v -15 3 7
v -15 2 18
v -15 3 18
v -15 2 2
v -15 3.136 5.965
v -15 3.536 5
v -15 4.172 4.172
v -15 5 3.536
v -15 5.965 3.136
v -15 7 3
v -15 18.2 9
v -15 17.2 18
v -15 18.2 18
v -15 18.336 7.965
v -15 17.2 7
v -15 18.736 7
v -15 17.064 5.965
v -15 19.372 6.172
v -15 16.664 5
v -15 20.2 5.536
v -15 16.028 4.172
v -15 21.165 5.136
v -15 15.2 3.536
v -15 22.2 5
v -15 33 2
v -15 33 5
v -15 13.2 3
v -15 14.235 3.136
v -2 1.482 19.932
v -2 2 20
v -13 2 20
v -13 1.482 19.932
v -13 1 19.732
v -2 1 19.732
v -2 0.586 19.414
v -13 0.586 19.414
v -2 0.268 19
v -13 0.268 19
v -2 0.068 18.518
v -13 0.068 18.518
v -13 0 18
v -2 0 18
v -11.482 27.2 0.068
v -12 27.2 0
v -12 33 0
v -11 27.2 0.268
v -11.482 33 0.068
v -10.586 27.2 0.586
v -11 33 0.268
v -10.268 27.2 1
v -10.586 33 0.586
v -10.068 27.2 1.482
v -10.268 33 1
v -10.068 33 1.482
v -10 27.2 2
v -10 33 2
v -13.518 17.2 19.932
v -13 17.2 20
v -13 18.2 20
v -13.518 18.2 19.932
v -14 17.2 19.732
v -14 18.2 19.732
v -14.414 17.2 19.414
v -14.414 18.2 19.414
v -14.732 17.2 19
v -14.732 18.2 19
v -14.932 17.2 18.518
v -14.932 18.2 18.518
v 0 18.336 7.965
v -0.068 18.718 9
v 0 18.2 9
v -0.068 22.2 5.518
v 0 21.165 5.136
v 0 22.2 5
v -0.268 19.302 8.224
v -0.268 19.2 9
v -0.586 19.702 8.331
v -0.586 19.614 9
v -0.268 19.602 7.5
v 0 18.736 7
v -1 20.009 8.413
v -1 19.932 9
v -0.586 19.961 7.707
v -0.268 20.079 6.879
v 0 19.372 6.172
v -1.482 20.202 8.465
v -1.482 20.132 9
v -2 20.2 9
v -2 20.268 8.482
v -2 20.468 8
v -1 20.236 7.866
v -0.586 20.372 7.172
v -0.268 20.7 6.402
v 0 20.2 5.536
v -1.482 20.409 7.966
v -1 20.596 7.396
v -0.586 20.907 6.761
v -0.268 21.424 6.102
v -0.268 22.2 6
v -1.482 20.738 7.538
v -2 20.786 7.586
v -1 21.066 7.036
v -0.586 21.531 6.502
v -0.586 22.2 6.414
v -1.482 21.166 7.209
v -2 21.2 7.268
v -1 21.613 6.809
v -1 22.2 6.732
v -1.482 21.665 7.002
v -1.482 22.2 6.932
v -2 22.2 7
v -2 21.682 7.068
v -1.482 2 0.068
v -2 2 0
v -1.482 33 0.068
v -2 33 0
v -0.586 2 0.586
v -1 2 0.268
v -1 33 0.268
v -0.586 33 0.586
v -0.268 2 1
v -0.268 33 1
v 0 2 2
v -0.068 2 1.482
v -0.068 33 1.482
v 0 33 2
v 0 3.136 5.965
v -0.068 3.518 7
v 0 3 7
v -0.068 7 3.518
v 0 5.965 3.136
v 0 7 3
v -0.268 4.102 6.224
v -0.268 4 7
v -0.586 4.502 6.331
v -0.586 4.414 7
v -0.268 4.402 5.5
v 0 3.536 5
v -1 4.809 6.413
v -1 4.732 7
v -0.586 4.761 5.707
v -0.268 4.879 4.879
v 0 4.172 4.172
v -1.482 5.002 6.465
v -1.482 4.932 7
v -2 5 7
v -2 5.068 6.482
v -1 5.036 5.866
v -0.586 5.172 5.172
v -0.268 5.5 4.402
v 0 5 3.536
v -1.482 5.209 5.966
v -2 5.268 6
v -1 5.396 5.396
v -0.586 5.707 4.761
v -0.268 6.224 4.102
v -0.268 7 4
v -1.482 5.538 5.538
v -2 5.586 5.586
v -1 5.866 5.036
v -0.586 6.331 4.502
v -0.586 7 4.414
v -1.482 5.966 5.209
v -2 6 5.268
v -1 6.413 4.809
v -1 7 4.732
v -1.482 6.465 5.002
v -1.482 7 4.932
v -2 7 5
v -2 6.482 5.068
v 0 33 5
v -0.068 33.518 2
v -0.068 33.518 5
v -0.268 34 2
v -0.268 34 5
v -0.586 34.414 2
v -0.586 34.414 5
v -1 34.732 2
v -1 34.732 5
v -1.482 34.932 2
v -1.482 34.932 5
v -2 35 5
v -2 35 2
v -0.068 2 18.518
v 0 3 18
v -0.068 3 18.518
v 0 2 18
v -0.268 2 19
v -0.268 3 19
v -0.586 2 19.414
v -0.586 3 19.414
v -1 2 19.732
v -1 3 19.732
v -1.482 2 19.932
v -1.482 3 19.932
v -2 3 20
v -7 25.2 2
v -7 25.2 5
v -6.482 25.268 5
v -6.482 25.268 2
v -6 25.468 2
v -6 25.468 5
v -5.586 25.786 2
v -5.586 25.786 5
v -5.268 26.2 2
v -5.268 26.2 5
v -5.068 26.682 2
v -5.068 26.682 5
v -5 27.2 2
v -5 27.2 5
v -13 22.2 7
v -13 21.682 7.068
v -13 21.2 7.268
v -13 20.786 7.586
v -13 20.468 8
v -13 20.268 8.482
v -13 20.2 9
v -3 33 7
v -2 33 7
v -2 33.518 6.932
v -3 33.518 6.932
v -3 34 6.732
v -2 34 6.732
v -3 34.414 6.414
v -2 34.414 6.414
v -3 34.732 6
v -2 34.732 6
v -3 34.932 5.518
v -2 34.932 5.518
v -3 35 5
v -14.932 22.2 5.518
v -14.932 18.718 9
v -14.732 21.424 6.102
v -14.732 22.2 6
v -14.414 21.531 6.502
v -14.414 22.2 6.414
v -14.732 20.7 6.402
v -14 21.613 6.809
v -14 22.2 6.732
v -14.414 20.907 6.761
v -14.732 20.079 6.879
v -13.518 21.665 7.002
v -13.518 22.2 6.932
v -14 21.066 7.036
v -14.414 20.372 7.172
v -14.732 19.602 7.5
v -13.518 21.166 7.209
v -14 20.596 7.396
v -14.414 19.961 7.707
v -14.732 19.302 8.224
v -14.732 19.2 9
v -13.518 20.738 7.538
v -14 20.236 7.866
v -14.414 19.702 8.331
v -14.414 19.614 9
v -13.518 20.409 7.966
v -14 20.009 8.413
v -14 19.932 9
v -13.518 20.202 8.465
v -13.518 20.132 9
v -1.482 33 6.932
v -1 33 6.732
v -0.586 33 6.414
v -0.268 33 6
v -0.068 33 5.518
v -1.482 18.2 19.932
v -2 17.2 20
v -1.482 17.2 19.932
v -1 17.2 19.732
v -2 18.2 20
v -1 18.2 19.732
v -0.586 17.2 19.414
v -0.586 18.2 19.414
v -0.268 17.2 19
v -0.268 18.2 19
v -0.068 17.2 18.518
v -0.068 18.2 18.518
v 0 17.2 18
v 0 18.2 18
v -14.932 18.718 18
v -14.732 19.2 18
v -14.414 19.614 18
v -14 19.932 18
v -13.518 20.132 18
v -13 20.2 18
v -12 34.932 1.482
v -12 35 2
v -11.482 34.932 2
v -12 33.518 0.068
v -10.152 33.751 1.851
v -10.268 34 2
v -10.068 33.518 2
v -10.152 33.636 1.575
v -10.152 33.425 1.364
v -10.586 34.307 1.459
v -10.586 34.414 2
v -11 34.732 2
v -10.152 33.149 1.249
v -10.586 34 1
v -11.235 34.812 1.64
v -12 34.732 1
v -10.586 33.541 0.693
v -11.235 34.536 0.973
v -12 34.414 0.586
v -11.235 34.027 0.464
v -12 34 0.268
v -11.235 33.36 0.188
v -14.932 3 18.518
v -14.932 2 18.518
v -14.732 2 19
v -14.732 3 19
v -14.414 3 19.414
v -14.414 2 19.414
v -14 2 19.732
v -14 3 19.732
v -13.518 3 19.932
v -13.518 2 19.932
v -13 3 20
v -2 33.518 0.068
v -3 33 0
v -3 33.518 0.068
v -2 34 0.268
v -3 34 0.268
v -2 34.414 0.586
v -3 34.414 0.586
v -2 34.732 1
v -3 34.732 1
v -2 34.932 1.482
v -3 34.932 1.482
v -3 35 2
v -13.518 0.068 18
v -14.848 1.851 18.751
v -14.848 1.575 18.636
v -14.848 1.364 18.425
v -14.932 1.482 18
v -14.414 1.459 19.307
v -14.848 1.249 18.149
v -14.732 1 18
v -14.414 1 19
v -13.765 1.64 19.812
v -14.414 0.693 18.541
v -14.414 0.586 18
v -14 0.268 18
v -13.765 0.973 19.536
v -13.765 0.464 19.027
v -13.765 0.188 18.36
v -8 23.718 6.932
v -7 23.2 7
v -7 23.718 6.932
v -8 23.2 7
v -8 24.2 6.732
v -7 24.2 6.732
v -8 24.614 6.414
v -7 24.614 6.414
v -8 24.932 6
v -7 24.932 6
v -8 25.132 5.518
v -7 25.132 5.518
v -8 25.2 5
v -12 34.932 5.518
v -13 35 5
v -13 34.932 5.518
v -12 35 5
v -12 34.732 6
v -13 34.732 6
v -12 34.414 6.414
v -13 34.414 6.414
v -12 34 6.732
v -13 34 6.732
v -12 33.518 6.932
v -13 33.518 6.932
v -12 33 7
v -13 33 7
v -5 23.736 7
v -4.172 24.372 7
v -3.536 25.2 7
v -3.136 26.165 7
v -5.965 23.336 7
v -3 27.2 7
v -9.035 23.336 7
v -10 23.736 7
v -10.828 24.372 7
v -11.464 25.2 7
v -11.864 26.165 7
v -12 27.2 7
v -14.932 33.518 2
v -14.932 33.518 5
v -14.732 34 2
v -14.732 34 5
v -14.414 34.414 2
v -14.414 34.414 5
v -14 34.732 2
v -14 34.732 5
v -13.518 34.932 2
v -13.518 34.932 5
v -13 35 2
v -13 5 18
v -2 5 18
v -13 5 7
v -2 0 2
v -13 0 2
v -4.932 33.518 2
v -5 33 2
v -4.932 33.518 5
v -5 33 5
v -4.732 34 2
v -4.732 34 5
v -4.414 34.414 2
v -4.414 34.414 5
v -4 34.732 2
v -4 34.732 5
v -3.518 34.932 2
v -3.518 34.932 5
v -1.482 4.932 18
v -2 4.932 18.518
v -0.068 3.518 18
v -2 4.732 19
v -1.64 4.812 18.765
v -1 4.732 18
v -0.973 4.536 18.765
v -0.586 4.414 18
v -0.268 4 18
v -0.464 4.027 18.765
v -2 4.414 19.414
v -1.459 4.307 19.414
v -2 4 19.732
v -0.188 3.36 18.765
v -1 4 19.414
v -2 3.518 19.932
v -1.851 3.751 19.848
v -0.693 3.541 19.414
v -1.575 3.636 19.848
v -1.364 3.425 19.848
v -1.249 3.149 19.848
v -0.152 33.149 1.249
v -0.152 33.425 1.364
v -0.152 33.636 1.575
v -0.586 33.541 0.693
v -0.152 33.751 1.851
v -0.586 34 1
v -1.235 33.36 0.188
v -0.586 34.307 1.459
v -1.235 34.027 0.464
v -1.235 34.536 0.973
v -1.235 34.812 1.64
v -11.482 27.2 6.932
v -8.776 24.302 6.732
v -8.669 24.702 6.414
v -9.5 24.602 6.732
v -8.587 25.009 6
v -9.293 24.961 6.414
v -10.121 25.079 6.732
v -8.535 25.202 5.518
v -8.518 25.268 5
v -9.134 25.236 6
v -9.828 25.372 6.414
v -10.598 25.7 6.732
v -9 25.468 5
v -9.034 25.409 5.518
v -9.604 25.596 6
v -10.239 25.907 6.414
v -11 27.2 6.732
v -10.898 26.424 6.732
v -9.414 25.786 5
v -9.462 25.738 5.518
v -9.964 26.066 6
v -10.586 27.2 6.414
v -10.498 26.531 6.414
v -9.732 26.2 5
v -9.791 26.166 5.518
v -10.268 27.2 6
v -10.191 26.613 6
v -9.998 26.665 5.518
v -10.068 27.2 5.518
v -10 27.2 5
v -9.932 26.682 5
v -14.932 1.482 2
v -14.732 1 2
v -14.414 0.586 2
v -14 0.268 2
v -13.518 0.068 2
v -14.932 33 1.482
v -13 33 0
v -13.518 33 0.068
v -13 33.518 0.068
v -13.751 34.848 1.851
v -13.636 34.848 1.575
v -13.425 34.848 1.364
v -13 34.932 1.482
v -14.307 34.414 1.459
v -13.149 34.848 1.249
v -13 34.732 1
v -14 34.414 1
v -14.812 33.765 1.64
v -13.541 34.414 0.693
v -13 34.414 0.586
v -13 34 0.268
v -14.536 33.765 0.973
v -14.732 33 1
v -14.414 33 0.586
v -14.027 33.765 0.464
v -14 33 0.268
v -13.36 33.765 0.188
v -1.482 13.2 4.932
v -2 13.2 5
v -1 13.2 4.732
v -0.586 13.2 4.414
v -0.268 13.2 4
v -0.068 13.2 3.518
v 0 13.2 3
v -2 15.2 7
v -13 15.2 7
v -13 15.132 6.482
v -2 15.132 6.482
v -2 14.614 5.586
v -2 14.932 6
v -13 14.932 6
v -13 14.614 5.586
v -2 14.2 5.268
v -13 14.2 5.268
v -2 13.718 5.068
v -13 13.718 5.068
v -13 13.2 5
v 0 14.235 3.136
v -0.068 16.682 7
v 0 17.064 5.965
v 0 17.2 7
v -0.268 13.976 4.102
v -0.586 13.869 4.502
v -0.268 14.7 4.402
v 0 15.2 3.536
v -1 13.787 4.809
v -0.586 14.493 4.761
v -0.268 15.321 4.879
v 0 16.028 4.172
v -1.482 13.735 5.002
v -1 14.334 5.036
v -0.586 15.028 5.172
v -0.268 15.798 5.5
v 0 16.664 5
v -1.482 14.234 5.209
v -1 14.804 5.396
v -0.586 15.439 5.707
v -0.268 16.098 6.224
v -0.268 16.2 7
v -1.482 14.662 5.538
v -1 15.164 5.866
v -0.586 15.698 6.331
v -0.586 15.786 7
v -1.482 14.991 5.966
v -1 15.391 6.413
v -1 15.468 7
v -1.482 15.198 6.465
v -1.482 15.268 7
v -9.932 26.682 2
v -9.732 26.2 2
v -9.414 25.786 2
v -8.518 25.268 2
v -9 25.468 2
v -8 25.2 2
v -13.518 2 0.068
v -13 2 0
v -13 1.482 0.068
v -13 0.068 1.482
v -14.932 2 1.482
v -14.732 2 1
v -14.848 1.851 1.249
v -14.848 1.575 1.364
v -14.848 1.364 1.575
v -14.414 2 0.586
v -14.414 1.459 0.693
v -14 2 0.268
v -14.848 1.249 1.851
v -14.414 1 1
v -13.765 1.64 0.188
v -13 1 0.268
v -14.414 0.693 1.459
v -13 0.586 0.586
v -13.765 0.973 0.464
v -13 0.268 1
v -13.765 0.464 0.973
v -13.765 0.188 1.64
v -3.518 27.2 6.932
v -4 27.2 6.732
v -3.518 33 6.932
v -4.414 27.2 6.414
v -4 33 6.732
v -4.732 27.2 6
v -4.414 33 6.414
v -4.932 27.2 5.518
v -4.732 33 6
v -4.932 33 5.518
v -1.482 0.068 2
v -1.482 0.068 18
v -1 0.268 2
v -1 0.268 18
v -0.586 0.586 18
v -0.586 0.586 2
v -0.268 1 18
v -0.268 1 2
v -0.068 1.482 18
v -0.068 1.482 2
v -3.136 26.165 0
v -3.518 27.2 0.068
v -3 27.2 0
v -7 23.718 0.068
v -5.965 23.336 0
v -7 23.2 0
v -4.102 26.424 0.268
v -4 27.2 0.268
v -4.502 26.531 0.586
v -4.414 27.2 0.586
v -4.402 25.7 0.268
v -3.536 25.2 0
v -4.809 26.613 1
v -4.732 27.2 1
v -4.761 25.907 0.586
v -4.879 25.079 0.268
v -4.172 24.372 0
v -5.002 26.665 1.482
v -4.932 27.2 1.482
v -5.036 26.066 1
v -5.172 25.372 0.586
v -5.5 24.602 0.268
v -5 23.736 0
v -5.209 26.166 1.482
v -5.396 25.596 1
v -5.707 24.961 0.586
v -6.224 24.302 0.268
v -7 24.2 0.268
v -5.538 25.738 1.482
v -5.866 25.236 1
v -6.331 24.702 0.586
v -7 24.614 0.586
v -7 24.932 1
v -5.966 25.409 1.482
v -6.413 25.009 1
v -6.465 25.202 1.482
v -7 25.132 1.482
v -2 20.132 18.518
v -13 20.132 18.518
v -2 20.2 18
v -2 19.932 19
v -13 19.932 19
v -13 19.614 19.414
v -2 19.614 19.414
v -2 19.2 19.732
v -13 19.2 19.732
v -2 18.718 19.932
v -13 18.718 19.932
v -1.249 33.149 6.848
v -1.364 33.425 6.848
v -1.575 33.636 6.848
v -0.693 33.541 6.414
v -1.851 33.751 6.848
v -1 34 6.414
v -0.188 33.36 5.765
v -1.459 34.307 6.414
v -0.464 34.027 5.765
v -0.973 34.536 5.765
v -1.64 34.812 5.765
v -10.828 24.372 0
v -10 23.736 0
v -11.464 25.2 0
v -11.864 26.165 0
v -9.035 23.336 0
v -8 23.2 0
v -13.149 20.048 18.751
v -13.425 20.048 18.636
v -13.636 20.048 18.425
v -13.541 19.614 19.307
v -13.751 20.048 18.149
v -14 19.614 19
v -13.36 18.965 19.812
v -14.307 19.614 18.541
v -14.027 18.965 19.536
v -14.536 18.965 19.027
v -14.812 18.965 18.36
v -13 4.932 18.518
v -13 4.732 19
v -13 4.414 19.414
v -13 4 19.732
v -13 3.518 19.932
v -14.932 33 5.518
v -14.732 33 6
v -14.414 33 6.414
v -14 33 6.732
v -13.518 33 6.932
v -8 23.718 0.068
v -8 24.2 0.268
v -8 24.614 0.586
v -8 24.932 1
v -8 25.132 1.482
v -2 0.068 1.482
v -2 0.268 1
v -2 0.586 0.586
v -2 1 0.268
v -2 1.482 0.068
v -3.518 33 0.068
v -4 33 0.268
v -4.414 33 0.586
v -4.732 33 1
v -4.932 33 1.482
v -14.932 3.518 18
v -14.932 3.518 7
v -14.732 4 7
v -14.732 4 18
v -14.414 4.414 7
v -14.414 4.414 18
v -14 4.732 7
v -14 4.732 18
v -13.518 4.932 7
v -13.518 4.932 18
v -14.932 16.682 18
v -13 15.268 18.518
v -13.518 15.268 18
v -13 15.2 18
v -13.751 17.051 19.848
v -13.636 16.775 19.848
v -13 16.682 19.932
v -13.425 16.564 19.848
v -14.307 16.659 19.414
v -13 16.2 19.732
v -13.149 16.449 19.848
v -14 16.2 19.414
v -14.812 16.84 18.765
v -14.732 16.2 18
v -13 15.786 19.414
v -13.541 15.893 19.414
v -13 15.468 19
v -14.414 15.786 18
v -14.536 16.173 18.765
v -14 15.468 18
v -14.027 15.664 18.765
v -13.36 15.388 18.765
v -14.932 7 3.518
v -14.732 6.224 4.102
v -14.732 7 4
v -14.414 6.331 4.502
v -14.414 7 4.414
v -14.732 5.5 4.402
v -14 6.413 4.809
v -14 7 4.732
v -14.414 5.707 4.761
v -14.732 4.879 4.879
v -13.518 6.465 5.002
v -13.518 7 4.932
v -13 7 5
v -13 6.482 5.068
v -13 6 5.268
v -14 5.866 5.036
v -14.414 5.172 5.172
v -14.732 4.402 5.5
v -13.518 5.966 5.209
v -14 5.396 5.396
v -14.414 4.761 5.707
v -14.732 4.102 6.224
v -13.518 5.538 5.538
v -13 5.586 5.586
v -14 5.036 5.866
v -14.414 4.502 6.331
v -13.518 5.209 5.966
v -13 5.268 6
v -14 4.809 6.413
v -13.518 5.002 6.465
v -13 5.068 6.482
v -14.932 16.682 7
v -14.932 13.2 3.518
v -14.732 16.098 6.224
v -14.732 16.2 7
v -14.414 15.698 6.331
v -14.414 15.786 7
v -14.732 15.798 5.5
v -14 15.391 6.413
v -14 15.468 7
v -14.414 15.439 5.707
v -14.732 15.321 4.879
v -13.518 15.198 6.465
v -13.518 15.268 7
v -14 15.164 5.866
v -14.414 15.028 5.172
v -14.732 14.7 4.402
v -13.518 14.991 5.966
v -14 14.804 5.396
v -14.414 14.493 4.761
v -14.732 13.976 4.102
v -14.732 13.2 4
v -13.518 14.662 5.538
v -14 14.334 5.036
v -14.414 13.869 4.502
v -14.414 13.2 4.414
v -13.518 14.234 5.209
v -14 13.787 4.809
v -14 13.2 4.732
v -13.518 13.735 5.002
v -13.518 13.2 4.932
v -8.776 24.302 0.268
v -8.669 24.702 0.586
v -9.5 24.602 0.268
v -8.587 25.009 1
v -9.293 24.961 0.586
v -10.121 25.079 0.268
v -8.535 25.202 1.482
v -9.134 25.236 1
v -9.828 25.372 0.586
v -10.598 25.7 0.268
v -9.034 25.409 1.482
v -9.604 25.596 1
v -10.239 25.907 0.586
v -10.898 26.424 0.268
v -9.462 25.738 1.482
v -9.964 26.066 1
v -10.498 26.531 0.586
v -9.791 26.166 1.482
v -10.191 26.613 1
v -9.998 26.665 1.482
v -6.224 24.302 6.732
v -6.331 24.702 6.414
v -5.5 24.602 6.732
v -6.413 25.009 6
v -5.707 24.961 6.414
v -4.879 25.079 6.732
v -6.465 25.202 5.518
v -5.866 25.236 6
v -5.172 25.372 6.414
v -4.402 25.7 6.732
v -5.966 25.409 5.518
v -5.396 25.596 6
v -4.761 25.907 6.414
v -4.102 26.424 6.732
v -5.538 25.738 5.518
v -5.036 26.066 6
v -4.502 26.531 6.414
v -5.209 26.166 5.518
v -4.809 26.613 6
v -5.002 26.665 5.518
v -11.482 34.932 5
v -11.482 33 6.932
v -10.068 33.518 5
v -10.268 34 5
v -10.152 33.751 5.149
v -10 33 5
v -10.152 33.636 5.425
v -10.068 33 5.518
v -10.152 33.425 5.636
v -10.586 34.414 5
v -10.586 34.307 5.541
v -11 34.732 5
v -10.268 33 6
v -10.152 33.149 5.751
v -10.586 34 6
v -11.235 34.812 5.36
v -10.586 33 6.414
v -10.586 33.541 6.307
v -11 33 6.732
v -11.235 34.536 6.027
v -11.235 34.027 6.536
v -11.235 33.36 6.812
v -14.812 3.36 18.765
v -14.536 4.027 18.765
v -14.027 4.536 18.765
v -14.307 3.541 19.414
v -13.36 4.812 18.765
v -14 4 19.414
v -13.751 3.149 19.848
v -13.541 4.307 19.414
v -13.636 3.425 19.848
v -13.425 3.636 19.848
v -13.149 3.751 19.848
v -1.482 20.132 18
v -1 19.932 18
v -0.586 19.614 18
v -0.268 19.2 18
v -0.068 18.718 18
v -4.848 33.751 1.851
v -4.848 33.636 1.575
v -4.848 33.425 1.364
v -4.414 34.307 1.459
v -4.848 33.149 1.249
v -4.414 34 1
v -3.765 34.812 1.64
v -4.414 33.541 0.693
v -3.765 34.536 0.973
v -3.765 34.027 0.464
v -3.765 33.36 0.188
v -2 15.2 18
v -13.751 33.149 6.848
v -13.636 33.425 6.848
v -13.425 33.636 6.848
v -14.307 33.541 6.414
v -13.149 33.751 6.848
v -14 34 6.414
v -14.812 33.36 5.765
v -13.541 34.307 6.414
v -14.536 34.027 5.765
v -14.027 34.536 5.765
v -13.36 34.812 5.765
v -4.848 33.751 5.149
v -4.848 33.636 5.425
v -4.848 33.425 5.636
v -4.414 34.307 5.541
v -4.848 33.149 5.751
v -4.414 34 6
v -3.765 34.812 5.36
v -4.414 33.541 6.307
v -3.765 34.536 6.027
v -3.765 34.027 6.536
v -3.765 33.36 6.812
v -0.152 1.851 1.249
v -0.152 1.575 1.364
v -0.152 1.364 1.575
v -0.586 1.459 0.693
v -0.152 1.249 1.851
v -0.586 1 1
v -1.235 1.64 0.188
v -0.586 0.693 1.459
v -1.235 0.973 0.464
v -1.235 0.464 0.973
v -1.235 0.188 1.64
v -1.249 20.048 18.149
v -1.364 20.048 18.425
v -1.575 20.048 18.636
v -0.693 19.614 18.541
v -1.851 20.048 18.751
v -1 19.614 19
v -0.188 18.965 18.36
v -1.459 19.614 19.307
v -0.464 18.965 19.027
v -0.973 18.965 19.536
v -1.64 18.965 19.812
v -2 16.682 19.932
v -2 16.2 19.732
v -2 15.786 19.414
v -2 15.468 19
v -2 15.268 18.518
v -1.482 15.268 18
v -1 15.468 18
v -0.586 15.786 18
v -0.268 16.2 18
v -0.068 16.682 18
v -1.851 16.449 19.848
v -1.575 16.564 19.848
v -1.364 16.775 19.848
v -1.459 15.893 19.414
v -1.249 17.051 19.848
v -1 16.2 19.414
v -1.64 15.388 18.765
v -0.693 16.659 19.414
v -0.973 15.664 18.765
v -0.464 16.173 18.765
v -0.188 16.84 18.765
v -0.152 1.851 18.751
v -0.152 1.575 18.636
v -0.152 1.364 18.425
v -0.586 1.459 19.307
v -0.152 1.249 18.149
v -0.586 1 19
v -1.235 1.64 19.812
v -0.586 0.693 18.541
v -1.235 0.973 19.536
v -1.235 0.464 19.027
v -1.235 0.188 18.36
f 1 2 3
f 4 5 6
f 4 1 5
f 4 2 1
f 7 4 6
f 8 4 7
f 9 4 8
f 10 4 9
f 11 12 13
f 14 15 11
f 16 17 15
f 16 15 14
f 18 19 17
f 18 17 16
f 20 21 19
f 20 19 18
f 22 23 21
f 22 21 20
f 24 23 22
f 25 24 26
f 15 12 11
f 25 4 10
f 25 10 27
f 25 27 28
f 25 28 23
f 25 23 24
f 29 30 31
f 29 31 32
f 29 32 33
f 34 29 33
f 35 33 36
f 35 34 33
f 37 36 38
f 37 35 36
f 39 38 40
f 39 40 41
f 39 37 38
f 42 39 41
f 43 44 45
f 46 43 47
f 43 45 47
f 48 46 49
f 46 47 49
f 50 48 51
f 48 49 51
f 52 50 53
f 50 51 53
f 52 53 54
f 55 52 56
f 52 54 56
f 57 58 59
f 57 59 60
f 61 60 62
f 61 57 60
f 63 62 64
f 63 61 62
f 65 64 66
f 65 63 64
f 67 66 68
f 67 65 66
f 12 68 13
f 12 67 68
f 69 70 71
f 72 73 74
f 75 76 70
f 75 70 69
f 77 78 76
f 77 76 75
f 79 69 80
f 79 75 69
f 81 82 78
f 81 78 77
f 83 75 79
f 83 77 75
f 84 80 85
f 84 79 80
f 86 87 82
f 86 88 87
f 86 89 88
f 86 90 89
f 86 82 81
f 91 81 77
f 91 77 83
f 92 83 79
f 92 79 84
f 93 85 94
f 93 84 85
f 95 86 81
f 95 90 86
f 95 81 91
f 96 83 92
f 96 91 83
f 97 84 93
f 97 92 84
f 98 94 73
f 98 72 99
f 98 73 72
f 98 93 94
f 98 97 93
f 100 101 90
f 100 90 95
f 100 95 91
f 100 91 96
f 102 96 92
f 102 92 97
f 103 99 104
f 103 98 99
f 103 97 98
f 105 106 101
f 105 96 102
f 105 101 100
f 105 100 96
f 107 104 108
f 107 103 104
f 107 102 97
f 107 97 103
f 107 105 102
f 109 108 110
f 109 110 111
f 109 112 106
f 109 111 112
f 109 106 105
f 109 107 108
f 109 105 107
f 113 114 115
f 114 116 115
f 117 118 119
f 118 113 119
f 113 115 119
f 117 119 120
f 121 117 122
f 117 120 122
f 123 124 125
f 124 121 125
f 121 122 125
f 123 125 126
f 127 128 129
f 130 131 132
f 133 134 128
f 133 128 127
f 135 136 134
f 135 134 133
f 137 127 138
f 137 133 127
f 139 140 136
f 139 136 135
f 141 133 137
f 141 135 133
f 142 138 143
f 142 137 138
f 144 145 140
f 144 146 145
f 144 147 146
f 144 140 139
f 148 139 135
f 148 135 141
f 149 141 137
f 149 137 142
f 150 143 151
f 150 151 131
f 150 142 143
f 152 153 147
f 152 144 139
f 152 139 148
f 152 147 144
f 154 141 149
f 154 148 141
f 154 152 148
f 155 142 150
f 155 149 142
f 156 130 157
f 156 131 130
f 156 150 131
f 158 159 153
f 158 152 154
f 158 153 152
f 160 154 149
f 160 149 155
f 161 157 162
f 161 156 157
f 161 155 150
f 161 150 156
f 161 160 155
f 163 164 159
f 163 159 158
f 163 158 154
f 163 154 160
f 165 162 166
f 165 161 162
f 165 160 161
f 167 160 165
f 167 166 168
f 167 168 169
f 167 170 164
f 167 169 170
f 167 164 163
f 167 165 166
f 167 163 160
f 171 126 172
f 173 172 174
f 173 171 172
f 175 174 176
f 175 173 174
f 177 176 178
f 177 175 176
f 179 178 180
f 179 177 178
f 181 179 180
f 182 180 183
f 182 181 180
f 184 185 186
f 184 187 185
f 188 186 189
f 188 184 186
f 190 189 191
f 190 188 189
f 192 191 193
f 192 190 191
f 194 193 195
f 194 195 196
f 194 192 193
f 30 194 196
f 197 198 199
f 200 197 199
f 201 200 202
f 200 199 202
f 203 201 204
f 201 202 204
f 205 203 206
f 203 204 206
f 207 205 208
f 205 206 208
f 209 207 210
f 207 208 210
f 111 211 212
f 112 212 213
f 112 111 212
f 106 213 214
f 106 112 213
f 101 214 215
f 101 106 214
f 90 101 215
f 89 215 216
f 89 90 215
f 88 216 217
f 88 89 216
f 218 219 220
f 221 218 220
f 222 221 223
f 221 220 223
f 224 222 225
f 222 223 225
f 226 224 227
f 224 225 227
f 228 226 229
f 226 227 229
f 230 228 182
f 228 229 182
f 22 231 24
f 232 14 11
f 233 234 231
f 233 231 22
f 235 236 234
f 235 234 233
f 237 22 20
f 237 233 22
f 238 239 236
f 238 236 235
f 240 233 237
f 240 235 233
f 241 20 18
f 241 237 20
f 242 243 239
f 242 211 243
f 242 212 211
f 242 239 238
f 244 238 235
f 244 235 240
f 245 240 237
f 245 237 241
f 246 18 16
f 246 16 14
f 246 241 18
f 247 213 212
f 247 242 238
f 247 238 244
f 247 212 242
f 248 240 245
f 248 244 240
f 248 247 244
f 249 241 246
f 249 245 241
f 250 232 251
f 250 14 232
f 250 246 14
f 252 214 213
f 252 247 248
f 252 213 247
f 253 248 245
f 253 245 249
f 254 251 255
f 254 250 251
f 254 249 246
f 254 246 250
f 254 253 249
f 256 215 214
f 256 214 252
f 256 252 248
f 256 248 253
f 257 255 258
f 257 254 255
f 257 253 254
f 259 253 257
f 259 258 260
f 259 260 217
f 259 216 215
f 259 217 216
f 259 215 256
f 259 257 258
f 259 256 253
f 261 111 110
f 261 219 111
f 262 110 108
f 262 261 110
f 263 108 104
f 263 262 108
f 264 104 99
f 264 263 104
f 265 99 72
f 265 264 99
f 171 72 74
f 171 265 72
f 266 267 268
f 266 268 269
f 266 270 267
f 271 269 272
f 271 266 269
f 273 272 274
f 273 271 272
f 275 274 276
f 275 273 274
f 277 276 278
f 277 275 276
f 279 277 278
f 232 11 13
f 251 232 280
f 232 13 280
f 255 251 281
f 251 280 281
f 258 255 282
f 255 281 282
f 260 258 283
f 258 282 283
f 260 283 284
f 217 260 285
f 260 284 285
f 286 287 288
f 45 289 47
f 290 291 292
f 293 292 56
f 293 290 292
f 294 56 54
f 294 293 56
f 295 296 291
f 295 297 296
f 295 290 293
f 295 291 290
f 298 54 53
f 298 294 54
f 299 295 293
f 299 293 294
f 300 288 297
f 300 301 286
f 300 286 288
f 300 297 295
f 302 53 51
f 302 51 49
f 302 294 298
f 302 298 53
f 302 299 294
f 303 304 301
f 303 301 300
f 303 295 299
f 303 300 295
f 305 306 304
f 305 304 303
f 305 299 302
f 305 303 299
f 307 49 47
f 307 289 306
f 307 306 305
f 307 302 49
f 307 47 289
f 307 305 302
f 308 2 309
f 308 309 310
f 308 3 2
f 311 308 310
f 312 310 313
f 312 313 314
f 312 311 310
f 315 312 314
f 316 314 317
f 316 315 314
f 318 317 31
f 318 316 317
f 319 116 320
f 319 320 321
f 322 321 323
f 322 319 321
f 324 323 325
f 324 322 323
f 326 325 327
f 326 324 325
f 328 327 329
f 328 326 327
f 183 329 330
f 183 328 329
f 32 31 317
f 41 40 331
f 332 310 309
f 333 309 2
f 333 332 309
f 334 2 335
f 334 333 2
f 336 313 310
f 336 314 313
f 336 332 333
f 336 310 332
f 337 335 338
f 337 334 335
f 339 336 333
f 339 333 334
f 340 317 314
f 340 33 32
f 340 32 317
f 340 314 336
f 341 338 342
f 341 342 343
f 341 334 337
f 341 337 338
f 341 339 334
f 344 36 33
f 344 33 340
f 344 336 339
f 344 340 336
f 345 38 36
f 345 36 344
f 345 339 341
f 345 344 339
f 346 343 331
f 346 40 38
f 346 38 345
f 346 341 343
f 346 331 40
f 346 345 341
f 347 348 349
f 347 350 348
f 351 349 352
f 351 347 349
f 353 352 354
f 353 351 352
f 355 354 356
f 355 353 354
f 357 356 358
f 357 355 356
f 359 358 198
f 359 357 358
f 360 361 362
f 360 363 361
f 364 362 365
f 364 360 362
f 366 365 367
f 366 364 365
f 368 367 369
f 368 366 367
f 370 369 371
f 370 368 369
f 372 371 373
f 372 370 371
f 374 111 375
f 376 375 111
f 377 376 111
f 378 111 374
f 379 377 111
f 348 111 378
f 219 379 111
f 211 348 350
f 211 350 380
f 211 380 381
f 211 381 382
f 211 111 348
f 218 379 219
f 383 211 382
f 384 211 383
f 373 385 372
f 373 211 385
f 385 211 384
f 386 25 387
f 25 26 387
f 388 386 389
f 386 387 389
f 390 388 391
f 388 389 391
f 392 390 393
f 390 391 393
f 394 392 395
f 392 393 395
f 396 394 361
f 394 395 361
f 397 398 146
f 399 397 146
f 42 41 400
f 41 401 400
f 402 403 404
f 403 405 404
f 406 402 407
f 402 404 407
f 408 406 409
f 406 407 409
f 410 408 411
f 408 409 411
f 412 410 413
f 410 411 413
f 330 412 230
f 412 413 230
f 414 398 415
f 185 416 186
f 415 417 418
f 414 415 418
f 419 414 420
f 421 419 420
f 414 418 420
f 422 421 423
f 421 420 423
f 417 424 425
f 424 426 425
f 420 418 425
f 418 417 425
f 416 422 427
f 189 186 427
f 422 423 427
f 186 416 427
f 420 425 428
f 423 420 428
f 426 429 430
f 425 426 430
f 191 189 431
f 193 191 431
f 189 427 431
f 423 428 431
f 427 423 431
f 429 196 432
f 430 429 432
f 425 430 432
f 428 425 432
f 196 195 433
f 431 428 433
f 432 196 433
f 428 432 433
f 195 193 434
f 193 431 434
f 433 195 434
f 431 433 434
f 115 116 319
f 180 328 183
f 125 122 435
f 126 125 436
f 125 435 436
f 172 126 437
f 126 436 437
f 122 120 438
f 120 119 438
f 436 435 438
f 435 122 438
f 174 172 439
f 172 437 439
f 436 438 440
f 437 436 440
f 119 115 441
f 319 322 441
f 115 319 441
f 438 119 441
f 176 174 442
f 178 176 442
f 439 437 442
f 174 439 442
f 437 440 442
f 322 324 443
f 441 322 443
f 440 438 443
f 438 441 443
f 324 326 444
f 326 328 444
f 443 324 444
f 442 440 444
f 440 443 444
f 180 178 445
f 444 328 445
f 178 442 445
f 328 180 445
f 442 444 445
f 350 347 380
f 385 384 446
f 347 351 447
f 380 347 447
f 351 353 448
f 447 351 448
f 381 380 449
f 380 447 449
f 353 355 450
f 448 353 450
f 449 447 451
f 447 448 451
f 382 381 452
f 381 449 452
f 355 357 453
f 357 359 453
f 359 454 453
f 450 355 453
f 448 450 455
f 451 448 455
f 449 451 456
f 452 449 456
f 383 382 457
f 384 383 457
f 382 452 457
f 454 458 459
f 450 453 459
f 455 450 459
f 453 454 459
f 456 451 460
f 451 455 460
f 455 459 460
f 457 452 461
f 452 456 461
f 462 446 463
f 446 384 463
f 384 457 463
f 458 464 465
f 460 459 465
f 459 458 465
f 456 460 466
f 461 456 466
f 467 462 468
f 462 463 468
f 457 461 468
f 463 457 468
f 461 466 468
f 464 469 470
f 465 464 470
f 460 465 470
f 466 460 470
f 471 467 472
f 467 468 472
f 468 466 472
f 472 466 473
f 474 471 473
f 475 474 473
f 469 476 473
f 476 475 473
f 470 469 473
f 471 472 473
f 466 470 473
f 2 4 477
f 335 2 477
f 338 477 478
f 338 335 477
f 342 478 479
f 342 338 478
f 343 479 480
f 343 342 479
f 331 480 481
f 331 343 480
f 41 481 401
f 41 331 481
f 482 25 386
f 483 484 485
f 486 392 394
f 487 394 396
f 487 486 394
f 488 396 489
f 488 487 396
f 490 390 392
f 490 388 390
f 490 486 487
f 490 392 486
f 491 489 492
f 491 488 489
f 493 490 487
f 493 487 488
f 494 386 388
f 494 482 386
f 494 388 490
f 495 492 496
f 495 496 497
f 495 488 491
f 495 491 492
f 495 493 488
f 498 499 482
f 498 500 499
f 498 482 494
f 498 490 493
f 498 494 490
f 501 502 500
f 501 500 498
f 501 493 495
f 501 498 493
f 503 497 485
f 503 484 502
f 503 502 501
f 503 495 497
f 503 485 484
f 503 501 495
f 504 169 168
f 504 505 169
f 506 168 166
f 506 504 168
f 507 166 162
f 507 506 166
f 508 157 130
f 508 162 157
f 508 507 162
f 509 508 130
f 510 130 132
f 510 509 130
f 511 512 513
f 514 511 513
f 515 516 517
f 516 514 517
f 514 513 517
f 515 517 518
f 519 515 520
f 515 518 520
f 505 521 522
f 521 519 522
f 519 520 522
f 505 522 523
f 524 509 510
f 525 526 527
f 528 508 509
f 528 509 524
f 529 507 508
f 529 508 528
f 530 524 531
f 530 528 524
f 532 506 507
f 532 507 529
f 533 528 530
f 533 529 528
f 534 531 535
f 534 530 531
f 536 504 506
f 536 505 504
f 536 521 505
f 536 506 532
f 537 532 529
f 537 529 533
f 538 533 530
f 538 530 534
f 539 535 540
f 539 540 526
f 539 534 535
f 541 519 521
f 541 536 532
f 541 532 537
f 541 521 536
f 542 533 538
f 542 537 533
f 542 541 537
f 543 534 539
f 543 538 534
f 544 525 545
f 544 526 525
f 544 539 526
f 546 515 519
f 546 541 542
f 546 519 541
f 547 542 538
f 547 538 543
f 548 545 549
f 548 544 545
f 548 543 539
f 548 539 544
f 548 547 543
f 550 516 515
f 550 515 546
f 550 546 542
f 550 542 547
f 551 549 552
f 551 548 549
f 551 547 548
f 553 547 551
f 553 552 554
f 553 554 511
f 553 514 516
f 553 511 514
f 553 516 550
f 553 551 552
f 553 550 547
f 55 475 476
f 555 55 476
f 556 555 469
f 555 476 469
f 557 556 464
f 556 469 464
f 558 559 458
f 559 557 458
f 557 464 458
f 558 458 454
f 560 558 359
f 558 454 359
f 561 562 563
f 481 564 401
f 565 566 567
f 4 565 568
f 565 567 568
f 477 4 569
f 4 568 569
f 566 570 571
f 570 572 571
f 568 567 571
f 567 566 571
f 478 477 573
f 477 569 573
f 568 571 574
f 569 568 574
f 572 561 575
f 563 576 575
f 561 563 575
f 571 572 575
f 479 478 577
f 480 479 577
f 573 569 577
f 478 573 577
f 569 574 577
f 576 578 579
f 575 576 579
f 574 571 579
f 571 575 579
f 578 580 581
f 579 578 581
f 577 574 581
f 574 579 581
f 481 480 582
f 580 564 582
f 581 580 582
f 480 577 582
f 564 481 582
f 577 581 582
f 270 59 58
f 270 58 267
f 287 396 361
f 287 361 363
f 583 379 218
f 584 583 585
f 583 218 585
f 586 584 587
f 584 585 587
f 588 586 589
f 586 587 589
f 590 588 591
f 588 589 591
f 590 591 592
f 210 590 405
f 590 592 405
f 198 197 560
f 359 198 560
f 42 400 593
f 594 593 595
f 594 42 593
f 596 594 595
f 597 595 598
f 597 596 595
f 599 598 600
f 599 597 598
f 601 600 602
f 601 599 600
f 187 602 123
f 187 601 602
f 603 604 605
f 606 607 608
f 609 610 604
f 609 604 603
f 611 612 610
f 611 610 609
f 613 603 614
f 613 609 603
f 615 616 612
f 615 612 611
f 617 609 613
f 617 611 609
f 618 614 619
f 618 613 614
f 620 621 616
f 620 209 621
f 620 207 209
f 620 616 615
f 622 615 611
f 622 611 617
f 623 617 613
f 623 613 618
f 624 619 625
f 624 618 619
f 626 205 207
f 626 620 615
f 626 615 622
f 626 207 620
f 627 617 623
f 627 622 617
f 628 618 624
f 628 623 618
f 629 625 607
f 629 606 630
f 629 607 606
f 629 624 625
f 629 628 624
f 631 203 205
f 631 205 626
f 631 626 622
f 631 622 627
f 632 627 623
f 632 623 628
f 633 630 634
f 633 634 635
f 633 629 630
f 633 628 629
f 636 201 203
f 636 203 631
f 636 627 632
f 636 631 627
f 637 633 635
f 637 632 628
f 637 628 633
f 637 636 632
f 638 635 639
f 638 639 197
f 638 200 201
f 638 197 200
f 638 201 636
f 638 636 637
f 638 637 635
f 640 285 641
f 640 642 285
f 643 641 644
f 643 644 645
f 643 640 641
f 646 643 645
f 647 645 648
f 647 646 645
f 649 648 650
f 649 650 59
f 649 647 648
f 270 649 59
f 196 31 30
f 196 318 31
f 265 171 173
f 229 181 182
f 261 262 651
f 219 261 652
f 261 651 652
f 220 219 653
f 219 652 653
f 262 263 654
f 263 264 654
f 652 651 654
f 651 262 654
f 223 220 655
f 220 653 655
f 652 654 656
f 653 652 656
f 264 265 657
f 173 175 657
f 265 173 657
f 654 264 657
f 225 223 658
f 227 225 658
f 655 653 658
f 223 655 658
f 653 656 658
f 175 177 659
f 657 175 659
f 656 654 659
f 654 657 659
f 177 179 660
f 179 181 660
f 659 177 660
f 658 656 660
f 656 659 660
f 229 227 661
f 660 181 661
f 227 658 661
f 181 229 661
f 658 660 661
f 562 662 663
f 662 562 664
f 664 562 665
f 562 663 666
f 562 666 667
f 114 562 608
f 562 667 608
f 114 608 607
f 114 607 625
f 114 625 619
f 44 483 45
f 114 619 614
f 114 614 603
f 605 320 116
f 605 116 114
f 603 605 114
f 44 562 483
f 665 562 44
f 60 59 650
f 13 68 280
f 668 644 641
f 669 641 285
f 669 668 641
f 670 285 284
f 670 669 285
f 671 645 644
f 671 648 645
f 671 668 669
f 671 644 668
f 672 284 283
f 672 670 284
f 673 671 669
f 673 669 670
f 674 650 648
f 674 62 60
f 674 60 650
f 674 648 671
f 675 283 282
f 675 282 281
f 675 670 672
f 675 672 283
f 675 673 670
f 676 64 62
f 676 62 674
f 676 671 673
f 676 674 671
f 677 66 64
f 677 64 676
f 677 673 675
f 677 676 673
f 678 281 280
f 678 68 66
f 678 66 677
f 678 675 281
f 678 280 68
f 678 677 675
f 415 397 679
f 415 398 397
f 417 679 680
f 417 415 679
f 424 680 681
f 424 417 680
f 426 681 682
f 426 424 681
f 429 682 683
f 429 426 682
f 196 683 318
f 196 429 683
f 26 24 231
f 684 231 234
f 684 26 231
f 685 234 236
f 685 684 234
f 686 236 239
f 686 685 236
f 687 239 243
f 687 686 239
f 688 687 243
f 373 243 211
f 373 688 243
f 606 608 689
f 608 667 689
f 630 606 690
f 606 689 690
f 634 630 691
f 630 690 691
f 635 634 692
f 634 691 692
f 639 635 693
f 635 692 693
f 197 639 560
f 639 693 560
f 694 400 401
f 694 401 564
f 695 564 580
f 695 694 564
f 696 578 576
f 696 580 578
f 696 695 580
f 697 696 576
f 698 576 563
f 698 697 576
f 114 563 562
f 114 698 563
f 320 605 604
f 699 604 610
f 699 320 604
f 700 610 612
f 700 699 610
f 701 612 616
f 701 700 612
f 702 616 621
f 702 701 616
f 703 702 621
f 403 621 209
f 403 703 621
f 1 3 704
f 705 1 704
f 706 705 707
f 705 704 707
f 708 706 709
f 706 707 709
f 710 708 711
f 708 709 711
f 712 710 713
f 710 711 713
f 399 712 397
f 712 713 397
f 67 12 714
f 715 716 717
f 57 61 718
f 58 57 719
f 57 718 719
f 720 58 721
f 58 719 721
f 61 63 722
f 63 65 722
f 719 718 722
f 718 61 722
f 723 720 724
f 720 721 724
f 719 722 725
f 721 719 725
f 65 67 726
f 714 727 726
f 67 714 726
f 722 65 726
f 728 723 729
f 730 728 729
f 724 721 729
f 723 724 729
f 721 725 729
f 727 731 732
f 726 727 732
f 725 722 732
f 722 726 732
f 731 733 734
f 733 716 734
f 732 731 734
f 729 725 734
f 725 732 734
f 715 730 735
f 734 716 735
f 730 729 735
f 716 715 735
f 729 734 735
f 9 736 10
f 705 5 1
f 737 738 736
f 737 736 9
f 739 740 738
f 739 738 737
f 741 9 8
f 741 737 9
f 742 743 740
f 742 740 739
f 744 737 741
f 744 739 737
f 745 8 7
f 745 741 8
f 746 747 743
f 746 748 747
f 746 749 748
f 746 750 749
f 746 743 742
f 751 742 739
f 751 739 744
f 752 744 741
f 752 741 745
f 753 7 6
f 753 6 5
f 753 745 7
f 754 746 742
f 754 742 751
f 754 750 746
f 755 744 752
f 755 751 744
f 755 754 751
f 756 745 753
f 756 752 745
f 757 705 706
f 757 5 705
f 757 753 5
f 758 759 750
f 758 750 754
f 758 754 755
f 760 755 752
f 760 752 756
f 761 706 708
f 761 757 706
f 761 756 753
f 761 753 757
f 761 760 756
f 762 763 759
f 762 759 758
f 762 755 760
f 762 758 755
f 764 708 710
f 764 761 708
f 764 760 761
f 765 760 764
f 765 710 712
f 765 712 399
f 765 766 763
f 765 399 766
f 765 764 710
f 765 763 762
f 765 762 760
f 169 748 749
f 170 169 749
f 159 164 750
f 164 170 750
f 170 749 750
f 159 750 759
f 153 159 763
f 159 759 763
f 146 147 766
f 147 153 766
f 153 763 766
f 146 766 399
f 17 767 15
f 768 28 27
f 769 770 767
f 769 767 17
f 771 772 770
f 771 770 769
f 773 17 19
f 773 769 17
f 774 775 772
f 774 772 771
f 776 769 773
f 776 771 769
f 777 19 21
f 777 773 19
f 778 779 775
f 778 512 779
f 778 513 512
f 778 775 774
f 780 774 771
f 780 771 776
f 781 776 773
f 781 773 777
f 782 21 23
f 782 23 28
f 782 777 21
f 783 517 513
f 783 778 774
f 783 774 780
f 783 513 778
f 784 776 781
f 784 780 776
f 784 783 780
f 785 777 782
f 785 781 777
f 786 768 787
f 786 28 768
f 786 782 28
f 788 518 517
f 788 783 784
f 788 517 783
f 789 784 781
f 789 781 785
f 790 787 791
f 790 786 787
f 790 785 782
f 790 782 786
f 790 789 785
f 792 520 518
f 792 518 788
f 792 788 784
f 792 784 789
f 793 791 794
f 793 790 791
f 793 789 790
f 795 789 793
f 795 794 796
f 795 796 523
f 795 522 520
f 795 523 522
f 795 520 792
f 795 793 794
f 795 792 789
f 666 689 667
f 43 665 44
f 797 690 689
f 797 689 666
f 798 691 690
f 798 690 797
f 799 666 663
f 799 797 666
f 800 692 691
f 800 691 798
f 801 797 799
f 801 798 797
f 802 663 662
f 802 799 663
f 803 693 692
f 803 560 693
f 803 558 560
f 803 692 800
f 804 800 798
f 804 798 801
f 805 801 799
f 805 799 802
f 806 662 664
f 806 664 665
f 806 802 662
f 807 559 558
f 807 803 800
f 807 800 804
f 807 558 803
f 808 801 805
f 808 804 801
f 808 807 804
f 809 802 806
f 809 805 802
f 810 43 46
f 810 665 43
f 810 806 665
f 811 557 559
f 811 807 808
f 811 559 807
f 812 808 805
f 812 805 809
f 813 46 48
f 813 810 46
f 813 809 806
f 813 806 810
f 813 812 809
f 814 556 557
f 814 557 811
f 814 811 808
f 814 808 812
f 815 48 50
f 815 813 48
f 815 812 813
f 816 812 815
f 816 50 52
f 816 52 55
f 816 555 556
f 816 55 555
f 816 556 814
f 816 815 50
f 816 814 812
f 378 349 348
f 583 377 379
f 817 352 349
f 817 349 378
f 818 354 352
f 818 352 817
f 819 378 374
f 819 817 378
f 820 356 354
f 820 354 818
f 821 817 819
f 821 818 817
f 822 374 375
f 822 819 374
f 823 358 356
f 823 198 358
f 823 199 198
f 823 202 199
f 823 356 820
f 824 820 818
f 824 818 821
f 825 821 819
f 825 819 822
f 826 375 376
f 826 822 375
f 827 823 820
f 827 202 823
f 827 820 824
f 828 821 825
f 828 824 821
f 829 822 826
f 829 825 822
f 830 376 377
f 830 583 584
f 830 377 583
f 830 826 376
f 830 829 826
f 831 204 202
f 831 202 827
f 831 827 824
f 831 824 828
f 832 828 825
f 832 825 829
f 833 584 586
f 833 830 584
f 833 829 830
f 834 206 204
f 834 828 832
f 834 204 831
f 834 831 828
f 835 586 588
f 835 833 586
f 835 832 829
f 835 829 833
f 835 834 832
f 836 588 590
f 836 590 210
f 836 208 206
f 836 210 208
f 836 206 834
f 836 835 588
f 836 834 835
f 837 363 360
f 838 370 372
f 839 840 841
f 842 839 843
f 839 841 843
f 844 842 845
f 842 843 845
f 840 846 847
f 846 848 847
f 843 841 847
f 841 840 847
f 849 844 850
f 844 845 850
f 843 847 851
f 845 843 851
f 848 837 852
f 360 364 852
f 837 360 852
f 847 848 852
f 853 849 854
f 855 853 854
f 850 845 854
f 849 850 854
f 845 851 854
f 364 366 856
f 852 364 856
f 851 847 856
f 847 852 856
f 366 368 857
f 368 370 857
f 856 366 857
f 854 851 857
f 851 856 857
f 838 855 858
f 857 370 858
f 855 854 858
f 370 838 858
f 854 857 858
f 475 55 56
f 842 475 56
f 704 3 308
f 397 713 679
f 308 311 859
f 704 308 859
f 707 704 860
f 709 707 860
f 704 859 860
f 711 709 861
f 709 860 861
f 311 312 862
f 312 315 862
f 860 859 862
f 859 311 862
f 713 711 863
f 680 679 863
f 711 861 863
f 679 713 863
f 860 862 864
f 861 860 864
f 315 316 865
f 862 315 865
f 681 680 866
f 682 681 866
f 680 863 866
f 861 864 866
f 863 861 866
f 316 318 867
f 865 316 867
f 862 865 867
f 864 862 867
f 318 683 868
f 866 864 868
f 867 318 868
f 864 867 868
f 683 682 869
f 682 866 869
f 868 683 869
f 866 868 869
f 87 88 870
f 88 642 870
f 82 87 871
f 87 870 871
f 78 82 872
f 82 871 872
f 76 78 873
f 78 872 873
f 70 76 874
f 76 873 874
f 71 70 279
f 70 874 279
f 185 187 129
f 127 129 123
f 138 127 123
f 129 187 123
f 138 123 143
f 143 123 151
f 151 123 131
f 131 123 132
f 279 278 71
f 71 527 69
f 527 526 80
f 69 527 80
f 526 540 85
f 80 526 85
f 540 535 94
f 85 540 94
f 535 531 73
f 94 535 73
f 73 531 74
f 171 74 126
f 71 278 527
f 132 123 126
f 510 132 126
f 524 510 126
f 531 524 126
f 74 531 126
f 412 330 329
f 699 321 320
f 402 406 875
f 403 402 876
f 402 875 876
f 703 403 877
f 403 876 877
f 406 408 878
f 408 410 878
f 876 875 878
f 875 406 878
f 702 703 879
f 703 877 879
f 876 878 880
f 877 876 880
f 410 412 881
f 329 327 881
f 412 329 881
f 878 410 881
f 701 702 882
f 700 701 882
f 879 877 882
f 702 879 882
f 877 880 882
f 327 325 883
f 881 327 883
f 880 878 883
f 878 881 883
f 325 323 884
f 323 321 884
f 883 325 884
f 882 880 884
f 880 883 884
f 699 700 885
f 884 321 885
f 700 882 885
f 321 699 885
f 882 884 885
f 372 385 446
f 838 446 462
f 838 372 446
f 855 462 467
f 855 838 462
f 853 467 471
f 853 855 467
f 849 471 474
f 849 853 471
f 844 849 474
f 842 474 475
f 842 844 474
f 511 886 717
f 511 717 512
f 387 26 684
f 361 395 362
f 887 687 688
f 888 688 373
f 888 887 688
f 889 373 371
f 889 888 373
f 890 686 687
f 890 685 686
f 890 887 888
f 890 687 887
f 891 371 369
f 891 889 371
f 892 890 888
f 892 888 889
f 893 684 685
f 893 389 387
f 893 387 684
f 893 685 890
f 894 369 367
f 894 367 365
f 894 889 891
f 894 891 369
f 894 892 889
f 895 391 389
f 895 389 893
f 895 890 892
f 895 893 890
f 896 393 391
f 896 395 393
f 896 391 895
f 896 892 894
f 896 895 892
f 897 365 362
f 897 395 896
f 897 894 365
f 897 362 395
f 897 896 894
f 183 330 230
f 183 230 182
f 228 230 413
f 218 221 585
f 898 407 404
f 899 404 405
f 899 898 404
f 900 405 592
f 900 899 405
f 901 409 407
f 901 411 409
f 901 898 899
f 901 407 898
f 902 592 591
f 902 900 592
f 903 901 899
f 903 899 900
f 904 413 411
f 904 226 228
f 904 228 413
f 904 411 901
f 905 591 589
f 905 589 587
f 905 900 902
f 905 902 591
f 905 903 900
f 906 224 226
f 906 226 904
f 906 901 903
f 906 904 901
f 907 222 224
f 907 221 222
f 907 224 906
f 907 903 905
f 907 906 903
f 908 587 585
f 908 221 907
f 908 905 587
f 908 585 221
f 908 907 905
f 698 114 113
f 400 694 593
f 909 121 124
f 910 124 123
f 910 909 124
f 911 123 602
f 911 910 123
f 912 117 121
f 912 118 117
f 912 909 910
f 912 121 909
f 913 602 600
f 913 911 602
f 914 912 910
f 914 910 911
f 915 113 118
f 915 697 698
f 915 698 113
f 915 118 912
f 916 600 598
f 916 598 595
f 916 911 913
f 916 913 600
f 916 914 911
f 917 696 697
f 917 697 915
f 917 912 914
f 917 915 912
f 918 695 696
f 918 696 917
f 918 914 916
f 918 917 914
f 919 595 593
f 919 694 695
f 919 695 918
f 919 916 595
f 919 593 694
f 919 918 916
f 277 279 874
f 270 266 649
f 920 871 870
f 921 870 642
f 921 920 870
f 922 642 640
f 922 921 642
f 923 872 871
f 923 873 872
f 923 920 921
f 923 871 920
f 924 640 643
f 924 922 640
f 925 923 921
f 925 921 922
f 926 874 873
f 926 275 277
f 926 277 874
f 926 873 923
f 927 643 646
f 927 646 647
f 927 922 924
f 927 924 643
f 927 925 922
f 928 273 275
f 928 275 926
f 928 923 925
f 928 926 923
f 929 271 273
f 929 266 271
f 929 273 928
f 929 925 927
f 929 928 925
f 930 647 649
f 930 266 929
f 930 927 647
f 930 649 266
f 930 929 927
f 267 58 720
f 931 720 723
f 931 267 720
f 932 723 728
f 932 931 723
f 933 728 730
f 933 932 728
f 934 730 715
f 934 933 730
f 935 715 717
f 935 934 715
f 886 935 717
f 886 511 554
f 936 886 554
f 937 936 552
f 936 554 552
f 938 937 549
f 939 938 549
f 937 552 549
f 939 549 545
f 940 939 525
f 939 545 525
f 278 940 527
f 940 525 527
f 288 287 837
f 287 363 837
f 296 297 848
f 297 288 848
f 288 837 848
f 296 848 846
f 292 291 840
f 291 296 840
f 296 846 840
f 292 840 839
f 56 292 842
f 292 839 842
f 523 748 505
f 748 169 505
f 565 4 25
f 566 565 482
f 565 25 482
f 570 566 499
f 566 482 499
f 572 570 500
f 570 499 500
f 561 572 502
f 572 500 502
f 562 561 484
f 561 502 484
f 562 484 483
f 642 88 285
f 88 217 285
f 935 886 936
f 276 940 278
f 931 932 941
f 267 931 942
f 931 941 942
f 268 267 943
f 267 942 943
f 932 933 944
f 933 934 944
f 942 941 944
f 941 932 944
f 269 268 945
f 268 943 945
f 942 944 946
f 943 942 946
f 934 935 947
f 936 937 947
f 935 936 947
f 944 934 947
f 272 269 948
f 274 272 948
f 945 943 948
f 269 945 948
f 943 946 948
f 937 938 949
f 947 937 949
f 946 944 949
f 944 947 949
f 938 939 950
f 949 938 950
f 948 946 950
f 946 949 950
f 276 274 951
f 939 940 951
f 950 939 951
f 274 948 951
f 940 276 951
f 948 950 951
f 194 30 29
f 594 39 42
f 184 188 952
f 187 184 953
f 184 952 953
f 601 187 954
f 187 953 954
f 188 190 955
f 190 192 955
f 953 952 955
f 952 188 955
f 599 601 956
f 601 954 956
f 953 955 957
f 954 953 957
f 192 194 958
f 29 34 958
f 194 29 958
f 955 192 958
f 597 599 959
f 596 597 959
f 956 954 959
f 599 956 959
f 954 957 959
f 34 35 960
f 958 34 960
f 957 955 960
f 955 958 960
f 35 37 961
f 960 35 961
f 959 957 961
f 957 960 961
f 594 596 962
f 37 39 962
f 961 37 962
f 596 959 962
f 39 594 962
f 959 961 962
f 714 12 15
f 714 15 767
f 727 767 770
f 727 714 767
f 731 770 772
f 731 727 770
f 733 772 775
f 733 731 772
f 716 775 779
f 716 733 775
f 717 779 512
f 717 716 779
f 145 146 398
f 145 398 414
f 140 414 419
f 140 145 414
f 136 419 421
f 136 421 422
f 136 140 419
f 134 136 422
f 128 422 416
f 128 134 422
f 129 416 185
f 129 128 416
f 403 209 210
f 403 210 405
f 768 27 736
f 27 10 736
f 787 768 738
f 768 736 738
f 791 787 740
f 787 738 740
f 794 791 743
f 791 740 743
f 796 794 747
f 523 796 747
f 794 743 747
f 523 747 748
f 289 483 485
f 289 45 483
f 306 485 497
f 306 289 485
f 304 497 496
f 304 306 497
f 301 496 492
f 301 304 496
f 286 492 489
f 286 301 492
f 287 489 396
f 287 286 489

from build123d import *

# Parameters (mm, degrees)
SKETCH1_W                      = 15
SKETCH1_H                      = 35
BOSS_EXTRUDE1_DEPTH            = 20
SKETCH2_W                      = 15
SKETCH2_H                      = 10.2
CUT_EXTRUDE1_DEPTH             = 44.011626335
FILLET1_R                      = 2
SKETCH4_W                      = 13
SKETCH4_H                      = 14.8
CUT_EXTRUDE3_DEPTH             = 44.011626335
CUT_EXTRUDE4_REACH             = 45.012
SKETCH5_W                      = 5
SKETCH5_H                      = 9.8
CUT_EXTRUDE4_DIRECTION_2_DEPTH = 44.011626335
FILLET2_R                      = 2


with BuildPart() as part:
    # Sketch1 → Boss-Extrude1 (new body)
    with BuildSketch(Plane.XY):
        with Locations((-7.5, 17.5)):
            Rectangle(SKETCH1_W, SKETCH1_H)
    extrude(amount=BOSS_EXTRUDE1_DEPTH)

    # Sketch2 → Cut-Extrude1 (cut, through all)
    with BuildSketch(Plane(origin=(0, 0, 0), x_dir=(0, 0, -1), z_dir=(1, 0, 0))):
        with Locations((-12.5, 10.1)):
            Rectangle(SKETCH2_W, SKETCH2_H)
    extrude(amount=-CUT_EXTRUDE1_DEPTH, mode=Mode.SUBTRACT)

    # Fillet1
    fillet1_edges = [part.edges().sort_by_distance(p)[0] for p in [
        (-15, 15.2, 12.5),
        (-15, 10.1, 5),
        (-7.5, 15.2, 5),
        (-15, 5, 12.5),
        (-7.5, 5, 5),
        (0, 5, 12.5),
        (0, 10.1, 5),
        (0, 15.2, 12.5),
    ]]
    fillet(fillet1_edges, radius=FILLET1_R)

    # Sketch4 → Cut-Extrude3 (cut, through all)
    with BuildSketch(Plane.ZY.offset(15)):
        with Locations((13.5, 27.6)):
            Rectangle(SKETCH4_W, SKETCH4_H)
    extrude(amount=-CUT_EXTRUDE3_DEPTH, mode=Mode.SUBTRACT)

    # Sketch5 → Cut-Extrude4 (cut, up to next)
    with BuildSketch(Plane(origin=(0, 0, 0), x_dir=(-1, 0, 0), z_dir=(0, 0, -1)), mode=Mode.PRIVATE) as cut_extrude4_sk1:
        with Locations((7.5, 30.1)):
            Rectangle(SKETCH5_W, SKETCH5_H)
    cut_extrude4_tool1 = extrude(cut_extrude4_sk1.sketch, amount=-CUT_EXTRUDE4_REACH, mode=Mode.PRIVATE) & part.part
    add(cut_extrude4_tool1.solids().sort_by_distance((-7.5, 30.1, 0))[0], mode=Mode.SUBTRACT)

    # Sketch5 → Cut-Extrude4 direction 2 (cut)
    with BuildSketch(Plane(origin=(0, 0, 0), x_dir=(-1, 0, 0), z_dir=(0, 0, -1))):
        with Locations((7.5, 30.1)):
            Rectangle(SKETCH5_W, SKETCH5_H)
    extrude(amount=CUT_EXTRUDE4_DIRECTION_2_DEPTH, mode=Mode.SUBTRACT)

    # Fillet2
    fillet2_edges = [part.edges().sort_by_distance(p)[0] for p in [
        (-7.5, 0, 20),
        (-15, 1.5, 20),
        (-7.5, 5, 20),
        (-0.585786438, 4.414213562, 20),
        (-14.414213562, 4.414213562, 20),
        (0, 18.7, 20),
        (-7.5, 15.2, 20),
        (-0.585786438, 15.785786438, 20),
        (-14.414213562, 15.785786438, 20),
        (0, 1.5, 20),
        (-7.5, 0, 0),
        (-15, 17.5, 0),
        (-2.5, 35, 0),
        (0, 17.5, 0),
        (-15, 18.7, 20),
        (-15, 35, 3.5),
        (0, 35, 3.5),
        (0, 20.2, 13.5),
        (-7.5, 20.2, 20),
        (0, 27.6, 7),
        (-7.5, 20.2, 7),
        (-2.5, 35, 7),
        (-15, 27.6, 7),
        (-15, 20.2, 13.5),
        (-12.5, 35, 7),
        (0, 0, 10),
        (-15, 0, 10),
        (-12.5, 35, 0),
        (-5, 35, 3.5),
        (-5, 25.2, 3.5),
        (-10, 25.2, 3.5),
        (-10, 35, 3.5),
        (-5, 30.1, 0),
        (-7.5, 25.2, 0),
        (-10, 30.1, 0),
        (-7.5, 25.2, 7),
        (-5, 30.1, 7),
        (-10, 30.1, 7),
    ]]
    fillet(fillet2_edges, radius=FILLET2_R)


solid = part.part
